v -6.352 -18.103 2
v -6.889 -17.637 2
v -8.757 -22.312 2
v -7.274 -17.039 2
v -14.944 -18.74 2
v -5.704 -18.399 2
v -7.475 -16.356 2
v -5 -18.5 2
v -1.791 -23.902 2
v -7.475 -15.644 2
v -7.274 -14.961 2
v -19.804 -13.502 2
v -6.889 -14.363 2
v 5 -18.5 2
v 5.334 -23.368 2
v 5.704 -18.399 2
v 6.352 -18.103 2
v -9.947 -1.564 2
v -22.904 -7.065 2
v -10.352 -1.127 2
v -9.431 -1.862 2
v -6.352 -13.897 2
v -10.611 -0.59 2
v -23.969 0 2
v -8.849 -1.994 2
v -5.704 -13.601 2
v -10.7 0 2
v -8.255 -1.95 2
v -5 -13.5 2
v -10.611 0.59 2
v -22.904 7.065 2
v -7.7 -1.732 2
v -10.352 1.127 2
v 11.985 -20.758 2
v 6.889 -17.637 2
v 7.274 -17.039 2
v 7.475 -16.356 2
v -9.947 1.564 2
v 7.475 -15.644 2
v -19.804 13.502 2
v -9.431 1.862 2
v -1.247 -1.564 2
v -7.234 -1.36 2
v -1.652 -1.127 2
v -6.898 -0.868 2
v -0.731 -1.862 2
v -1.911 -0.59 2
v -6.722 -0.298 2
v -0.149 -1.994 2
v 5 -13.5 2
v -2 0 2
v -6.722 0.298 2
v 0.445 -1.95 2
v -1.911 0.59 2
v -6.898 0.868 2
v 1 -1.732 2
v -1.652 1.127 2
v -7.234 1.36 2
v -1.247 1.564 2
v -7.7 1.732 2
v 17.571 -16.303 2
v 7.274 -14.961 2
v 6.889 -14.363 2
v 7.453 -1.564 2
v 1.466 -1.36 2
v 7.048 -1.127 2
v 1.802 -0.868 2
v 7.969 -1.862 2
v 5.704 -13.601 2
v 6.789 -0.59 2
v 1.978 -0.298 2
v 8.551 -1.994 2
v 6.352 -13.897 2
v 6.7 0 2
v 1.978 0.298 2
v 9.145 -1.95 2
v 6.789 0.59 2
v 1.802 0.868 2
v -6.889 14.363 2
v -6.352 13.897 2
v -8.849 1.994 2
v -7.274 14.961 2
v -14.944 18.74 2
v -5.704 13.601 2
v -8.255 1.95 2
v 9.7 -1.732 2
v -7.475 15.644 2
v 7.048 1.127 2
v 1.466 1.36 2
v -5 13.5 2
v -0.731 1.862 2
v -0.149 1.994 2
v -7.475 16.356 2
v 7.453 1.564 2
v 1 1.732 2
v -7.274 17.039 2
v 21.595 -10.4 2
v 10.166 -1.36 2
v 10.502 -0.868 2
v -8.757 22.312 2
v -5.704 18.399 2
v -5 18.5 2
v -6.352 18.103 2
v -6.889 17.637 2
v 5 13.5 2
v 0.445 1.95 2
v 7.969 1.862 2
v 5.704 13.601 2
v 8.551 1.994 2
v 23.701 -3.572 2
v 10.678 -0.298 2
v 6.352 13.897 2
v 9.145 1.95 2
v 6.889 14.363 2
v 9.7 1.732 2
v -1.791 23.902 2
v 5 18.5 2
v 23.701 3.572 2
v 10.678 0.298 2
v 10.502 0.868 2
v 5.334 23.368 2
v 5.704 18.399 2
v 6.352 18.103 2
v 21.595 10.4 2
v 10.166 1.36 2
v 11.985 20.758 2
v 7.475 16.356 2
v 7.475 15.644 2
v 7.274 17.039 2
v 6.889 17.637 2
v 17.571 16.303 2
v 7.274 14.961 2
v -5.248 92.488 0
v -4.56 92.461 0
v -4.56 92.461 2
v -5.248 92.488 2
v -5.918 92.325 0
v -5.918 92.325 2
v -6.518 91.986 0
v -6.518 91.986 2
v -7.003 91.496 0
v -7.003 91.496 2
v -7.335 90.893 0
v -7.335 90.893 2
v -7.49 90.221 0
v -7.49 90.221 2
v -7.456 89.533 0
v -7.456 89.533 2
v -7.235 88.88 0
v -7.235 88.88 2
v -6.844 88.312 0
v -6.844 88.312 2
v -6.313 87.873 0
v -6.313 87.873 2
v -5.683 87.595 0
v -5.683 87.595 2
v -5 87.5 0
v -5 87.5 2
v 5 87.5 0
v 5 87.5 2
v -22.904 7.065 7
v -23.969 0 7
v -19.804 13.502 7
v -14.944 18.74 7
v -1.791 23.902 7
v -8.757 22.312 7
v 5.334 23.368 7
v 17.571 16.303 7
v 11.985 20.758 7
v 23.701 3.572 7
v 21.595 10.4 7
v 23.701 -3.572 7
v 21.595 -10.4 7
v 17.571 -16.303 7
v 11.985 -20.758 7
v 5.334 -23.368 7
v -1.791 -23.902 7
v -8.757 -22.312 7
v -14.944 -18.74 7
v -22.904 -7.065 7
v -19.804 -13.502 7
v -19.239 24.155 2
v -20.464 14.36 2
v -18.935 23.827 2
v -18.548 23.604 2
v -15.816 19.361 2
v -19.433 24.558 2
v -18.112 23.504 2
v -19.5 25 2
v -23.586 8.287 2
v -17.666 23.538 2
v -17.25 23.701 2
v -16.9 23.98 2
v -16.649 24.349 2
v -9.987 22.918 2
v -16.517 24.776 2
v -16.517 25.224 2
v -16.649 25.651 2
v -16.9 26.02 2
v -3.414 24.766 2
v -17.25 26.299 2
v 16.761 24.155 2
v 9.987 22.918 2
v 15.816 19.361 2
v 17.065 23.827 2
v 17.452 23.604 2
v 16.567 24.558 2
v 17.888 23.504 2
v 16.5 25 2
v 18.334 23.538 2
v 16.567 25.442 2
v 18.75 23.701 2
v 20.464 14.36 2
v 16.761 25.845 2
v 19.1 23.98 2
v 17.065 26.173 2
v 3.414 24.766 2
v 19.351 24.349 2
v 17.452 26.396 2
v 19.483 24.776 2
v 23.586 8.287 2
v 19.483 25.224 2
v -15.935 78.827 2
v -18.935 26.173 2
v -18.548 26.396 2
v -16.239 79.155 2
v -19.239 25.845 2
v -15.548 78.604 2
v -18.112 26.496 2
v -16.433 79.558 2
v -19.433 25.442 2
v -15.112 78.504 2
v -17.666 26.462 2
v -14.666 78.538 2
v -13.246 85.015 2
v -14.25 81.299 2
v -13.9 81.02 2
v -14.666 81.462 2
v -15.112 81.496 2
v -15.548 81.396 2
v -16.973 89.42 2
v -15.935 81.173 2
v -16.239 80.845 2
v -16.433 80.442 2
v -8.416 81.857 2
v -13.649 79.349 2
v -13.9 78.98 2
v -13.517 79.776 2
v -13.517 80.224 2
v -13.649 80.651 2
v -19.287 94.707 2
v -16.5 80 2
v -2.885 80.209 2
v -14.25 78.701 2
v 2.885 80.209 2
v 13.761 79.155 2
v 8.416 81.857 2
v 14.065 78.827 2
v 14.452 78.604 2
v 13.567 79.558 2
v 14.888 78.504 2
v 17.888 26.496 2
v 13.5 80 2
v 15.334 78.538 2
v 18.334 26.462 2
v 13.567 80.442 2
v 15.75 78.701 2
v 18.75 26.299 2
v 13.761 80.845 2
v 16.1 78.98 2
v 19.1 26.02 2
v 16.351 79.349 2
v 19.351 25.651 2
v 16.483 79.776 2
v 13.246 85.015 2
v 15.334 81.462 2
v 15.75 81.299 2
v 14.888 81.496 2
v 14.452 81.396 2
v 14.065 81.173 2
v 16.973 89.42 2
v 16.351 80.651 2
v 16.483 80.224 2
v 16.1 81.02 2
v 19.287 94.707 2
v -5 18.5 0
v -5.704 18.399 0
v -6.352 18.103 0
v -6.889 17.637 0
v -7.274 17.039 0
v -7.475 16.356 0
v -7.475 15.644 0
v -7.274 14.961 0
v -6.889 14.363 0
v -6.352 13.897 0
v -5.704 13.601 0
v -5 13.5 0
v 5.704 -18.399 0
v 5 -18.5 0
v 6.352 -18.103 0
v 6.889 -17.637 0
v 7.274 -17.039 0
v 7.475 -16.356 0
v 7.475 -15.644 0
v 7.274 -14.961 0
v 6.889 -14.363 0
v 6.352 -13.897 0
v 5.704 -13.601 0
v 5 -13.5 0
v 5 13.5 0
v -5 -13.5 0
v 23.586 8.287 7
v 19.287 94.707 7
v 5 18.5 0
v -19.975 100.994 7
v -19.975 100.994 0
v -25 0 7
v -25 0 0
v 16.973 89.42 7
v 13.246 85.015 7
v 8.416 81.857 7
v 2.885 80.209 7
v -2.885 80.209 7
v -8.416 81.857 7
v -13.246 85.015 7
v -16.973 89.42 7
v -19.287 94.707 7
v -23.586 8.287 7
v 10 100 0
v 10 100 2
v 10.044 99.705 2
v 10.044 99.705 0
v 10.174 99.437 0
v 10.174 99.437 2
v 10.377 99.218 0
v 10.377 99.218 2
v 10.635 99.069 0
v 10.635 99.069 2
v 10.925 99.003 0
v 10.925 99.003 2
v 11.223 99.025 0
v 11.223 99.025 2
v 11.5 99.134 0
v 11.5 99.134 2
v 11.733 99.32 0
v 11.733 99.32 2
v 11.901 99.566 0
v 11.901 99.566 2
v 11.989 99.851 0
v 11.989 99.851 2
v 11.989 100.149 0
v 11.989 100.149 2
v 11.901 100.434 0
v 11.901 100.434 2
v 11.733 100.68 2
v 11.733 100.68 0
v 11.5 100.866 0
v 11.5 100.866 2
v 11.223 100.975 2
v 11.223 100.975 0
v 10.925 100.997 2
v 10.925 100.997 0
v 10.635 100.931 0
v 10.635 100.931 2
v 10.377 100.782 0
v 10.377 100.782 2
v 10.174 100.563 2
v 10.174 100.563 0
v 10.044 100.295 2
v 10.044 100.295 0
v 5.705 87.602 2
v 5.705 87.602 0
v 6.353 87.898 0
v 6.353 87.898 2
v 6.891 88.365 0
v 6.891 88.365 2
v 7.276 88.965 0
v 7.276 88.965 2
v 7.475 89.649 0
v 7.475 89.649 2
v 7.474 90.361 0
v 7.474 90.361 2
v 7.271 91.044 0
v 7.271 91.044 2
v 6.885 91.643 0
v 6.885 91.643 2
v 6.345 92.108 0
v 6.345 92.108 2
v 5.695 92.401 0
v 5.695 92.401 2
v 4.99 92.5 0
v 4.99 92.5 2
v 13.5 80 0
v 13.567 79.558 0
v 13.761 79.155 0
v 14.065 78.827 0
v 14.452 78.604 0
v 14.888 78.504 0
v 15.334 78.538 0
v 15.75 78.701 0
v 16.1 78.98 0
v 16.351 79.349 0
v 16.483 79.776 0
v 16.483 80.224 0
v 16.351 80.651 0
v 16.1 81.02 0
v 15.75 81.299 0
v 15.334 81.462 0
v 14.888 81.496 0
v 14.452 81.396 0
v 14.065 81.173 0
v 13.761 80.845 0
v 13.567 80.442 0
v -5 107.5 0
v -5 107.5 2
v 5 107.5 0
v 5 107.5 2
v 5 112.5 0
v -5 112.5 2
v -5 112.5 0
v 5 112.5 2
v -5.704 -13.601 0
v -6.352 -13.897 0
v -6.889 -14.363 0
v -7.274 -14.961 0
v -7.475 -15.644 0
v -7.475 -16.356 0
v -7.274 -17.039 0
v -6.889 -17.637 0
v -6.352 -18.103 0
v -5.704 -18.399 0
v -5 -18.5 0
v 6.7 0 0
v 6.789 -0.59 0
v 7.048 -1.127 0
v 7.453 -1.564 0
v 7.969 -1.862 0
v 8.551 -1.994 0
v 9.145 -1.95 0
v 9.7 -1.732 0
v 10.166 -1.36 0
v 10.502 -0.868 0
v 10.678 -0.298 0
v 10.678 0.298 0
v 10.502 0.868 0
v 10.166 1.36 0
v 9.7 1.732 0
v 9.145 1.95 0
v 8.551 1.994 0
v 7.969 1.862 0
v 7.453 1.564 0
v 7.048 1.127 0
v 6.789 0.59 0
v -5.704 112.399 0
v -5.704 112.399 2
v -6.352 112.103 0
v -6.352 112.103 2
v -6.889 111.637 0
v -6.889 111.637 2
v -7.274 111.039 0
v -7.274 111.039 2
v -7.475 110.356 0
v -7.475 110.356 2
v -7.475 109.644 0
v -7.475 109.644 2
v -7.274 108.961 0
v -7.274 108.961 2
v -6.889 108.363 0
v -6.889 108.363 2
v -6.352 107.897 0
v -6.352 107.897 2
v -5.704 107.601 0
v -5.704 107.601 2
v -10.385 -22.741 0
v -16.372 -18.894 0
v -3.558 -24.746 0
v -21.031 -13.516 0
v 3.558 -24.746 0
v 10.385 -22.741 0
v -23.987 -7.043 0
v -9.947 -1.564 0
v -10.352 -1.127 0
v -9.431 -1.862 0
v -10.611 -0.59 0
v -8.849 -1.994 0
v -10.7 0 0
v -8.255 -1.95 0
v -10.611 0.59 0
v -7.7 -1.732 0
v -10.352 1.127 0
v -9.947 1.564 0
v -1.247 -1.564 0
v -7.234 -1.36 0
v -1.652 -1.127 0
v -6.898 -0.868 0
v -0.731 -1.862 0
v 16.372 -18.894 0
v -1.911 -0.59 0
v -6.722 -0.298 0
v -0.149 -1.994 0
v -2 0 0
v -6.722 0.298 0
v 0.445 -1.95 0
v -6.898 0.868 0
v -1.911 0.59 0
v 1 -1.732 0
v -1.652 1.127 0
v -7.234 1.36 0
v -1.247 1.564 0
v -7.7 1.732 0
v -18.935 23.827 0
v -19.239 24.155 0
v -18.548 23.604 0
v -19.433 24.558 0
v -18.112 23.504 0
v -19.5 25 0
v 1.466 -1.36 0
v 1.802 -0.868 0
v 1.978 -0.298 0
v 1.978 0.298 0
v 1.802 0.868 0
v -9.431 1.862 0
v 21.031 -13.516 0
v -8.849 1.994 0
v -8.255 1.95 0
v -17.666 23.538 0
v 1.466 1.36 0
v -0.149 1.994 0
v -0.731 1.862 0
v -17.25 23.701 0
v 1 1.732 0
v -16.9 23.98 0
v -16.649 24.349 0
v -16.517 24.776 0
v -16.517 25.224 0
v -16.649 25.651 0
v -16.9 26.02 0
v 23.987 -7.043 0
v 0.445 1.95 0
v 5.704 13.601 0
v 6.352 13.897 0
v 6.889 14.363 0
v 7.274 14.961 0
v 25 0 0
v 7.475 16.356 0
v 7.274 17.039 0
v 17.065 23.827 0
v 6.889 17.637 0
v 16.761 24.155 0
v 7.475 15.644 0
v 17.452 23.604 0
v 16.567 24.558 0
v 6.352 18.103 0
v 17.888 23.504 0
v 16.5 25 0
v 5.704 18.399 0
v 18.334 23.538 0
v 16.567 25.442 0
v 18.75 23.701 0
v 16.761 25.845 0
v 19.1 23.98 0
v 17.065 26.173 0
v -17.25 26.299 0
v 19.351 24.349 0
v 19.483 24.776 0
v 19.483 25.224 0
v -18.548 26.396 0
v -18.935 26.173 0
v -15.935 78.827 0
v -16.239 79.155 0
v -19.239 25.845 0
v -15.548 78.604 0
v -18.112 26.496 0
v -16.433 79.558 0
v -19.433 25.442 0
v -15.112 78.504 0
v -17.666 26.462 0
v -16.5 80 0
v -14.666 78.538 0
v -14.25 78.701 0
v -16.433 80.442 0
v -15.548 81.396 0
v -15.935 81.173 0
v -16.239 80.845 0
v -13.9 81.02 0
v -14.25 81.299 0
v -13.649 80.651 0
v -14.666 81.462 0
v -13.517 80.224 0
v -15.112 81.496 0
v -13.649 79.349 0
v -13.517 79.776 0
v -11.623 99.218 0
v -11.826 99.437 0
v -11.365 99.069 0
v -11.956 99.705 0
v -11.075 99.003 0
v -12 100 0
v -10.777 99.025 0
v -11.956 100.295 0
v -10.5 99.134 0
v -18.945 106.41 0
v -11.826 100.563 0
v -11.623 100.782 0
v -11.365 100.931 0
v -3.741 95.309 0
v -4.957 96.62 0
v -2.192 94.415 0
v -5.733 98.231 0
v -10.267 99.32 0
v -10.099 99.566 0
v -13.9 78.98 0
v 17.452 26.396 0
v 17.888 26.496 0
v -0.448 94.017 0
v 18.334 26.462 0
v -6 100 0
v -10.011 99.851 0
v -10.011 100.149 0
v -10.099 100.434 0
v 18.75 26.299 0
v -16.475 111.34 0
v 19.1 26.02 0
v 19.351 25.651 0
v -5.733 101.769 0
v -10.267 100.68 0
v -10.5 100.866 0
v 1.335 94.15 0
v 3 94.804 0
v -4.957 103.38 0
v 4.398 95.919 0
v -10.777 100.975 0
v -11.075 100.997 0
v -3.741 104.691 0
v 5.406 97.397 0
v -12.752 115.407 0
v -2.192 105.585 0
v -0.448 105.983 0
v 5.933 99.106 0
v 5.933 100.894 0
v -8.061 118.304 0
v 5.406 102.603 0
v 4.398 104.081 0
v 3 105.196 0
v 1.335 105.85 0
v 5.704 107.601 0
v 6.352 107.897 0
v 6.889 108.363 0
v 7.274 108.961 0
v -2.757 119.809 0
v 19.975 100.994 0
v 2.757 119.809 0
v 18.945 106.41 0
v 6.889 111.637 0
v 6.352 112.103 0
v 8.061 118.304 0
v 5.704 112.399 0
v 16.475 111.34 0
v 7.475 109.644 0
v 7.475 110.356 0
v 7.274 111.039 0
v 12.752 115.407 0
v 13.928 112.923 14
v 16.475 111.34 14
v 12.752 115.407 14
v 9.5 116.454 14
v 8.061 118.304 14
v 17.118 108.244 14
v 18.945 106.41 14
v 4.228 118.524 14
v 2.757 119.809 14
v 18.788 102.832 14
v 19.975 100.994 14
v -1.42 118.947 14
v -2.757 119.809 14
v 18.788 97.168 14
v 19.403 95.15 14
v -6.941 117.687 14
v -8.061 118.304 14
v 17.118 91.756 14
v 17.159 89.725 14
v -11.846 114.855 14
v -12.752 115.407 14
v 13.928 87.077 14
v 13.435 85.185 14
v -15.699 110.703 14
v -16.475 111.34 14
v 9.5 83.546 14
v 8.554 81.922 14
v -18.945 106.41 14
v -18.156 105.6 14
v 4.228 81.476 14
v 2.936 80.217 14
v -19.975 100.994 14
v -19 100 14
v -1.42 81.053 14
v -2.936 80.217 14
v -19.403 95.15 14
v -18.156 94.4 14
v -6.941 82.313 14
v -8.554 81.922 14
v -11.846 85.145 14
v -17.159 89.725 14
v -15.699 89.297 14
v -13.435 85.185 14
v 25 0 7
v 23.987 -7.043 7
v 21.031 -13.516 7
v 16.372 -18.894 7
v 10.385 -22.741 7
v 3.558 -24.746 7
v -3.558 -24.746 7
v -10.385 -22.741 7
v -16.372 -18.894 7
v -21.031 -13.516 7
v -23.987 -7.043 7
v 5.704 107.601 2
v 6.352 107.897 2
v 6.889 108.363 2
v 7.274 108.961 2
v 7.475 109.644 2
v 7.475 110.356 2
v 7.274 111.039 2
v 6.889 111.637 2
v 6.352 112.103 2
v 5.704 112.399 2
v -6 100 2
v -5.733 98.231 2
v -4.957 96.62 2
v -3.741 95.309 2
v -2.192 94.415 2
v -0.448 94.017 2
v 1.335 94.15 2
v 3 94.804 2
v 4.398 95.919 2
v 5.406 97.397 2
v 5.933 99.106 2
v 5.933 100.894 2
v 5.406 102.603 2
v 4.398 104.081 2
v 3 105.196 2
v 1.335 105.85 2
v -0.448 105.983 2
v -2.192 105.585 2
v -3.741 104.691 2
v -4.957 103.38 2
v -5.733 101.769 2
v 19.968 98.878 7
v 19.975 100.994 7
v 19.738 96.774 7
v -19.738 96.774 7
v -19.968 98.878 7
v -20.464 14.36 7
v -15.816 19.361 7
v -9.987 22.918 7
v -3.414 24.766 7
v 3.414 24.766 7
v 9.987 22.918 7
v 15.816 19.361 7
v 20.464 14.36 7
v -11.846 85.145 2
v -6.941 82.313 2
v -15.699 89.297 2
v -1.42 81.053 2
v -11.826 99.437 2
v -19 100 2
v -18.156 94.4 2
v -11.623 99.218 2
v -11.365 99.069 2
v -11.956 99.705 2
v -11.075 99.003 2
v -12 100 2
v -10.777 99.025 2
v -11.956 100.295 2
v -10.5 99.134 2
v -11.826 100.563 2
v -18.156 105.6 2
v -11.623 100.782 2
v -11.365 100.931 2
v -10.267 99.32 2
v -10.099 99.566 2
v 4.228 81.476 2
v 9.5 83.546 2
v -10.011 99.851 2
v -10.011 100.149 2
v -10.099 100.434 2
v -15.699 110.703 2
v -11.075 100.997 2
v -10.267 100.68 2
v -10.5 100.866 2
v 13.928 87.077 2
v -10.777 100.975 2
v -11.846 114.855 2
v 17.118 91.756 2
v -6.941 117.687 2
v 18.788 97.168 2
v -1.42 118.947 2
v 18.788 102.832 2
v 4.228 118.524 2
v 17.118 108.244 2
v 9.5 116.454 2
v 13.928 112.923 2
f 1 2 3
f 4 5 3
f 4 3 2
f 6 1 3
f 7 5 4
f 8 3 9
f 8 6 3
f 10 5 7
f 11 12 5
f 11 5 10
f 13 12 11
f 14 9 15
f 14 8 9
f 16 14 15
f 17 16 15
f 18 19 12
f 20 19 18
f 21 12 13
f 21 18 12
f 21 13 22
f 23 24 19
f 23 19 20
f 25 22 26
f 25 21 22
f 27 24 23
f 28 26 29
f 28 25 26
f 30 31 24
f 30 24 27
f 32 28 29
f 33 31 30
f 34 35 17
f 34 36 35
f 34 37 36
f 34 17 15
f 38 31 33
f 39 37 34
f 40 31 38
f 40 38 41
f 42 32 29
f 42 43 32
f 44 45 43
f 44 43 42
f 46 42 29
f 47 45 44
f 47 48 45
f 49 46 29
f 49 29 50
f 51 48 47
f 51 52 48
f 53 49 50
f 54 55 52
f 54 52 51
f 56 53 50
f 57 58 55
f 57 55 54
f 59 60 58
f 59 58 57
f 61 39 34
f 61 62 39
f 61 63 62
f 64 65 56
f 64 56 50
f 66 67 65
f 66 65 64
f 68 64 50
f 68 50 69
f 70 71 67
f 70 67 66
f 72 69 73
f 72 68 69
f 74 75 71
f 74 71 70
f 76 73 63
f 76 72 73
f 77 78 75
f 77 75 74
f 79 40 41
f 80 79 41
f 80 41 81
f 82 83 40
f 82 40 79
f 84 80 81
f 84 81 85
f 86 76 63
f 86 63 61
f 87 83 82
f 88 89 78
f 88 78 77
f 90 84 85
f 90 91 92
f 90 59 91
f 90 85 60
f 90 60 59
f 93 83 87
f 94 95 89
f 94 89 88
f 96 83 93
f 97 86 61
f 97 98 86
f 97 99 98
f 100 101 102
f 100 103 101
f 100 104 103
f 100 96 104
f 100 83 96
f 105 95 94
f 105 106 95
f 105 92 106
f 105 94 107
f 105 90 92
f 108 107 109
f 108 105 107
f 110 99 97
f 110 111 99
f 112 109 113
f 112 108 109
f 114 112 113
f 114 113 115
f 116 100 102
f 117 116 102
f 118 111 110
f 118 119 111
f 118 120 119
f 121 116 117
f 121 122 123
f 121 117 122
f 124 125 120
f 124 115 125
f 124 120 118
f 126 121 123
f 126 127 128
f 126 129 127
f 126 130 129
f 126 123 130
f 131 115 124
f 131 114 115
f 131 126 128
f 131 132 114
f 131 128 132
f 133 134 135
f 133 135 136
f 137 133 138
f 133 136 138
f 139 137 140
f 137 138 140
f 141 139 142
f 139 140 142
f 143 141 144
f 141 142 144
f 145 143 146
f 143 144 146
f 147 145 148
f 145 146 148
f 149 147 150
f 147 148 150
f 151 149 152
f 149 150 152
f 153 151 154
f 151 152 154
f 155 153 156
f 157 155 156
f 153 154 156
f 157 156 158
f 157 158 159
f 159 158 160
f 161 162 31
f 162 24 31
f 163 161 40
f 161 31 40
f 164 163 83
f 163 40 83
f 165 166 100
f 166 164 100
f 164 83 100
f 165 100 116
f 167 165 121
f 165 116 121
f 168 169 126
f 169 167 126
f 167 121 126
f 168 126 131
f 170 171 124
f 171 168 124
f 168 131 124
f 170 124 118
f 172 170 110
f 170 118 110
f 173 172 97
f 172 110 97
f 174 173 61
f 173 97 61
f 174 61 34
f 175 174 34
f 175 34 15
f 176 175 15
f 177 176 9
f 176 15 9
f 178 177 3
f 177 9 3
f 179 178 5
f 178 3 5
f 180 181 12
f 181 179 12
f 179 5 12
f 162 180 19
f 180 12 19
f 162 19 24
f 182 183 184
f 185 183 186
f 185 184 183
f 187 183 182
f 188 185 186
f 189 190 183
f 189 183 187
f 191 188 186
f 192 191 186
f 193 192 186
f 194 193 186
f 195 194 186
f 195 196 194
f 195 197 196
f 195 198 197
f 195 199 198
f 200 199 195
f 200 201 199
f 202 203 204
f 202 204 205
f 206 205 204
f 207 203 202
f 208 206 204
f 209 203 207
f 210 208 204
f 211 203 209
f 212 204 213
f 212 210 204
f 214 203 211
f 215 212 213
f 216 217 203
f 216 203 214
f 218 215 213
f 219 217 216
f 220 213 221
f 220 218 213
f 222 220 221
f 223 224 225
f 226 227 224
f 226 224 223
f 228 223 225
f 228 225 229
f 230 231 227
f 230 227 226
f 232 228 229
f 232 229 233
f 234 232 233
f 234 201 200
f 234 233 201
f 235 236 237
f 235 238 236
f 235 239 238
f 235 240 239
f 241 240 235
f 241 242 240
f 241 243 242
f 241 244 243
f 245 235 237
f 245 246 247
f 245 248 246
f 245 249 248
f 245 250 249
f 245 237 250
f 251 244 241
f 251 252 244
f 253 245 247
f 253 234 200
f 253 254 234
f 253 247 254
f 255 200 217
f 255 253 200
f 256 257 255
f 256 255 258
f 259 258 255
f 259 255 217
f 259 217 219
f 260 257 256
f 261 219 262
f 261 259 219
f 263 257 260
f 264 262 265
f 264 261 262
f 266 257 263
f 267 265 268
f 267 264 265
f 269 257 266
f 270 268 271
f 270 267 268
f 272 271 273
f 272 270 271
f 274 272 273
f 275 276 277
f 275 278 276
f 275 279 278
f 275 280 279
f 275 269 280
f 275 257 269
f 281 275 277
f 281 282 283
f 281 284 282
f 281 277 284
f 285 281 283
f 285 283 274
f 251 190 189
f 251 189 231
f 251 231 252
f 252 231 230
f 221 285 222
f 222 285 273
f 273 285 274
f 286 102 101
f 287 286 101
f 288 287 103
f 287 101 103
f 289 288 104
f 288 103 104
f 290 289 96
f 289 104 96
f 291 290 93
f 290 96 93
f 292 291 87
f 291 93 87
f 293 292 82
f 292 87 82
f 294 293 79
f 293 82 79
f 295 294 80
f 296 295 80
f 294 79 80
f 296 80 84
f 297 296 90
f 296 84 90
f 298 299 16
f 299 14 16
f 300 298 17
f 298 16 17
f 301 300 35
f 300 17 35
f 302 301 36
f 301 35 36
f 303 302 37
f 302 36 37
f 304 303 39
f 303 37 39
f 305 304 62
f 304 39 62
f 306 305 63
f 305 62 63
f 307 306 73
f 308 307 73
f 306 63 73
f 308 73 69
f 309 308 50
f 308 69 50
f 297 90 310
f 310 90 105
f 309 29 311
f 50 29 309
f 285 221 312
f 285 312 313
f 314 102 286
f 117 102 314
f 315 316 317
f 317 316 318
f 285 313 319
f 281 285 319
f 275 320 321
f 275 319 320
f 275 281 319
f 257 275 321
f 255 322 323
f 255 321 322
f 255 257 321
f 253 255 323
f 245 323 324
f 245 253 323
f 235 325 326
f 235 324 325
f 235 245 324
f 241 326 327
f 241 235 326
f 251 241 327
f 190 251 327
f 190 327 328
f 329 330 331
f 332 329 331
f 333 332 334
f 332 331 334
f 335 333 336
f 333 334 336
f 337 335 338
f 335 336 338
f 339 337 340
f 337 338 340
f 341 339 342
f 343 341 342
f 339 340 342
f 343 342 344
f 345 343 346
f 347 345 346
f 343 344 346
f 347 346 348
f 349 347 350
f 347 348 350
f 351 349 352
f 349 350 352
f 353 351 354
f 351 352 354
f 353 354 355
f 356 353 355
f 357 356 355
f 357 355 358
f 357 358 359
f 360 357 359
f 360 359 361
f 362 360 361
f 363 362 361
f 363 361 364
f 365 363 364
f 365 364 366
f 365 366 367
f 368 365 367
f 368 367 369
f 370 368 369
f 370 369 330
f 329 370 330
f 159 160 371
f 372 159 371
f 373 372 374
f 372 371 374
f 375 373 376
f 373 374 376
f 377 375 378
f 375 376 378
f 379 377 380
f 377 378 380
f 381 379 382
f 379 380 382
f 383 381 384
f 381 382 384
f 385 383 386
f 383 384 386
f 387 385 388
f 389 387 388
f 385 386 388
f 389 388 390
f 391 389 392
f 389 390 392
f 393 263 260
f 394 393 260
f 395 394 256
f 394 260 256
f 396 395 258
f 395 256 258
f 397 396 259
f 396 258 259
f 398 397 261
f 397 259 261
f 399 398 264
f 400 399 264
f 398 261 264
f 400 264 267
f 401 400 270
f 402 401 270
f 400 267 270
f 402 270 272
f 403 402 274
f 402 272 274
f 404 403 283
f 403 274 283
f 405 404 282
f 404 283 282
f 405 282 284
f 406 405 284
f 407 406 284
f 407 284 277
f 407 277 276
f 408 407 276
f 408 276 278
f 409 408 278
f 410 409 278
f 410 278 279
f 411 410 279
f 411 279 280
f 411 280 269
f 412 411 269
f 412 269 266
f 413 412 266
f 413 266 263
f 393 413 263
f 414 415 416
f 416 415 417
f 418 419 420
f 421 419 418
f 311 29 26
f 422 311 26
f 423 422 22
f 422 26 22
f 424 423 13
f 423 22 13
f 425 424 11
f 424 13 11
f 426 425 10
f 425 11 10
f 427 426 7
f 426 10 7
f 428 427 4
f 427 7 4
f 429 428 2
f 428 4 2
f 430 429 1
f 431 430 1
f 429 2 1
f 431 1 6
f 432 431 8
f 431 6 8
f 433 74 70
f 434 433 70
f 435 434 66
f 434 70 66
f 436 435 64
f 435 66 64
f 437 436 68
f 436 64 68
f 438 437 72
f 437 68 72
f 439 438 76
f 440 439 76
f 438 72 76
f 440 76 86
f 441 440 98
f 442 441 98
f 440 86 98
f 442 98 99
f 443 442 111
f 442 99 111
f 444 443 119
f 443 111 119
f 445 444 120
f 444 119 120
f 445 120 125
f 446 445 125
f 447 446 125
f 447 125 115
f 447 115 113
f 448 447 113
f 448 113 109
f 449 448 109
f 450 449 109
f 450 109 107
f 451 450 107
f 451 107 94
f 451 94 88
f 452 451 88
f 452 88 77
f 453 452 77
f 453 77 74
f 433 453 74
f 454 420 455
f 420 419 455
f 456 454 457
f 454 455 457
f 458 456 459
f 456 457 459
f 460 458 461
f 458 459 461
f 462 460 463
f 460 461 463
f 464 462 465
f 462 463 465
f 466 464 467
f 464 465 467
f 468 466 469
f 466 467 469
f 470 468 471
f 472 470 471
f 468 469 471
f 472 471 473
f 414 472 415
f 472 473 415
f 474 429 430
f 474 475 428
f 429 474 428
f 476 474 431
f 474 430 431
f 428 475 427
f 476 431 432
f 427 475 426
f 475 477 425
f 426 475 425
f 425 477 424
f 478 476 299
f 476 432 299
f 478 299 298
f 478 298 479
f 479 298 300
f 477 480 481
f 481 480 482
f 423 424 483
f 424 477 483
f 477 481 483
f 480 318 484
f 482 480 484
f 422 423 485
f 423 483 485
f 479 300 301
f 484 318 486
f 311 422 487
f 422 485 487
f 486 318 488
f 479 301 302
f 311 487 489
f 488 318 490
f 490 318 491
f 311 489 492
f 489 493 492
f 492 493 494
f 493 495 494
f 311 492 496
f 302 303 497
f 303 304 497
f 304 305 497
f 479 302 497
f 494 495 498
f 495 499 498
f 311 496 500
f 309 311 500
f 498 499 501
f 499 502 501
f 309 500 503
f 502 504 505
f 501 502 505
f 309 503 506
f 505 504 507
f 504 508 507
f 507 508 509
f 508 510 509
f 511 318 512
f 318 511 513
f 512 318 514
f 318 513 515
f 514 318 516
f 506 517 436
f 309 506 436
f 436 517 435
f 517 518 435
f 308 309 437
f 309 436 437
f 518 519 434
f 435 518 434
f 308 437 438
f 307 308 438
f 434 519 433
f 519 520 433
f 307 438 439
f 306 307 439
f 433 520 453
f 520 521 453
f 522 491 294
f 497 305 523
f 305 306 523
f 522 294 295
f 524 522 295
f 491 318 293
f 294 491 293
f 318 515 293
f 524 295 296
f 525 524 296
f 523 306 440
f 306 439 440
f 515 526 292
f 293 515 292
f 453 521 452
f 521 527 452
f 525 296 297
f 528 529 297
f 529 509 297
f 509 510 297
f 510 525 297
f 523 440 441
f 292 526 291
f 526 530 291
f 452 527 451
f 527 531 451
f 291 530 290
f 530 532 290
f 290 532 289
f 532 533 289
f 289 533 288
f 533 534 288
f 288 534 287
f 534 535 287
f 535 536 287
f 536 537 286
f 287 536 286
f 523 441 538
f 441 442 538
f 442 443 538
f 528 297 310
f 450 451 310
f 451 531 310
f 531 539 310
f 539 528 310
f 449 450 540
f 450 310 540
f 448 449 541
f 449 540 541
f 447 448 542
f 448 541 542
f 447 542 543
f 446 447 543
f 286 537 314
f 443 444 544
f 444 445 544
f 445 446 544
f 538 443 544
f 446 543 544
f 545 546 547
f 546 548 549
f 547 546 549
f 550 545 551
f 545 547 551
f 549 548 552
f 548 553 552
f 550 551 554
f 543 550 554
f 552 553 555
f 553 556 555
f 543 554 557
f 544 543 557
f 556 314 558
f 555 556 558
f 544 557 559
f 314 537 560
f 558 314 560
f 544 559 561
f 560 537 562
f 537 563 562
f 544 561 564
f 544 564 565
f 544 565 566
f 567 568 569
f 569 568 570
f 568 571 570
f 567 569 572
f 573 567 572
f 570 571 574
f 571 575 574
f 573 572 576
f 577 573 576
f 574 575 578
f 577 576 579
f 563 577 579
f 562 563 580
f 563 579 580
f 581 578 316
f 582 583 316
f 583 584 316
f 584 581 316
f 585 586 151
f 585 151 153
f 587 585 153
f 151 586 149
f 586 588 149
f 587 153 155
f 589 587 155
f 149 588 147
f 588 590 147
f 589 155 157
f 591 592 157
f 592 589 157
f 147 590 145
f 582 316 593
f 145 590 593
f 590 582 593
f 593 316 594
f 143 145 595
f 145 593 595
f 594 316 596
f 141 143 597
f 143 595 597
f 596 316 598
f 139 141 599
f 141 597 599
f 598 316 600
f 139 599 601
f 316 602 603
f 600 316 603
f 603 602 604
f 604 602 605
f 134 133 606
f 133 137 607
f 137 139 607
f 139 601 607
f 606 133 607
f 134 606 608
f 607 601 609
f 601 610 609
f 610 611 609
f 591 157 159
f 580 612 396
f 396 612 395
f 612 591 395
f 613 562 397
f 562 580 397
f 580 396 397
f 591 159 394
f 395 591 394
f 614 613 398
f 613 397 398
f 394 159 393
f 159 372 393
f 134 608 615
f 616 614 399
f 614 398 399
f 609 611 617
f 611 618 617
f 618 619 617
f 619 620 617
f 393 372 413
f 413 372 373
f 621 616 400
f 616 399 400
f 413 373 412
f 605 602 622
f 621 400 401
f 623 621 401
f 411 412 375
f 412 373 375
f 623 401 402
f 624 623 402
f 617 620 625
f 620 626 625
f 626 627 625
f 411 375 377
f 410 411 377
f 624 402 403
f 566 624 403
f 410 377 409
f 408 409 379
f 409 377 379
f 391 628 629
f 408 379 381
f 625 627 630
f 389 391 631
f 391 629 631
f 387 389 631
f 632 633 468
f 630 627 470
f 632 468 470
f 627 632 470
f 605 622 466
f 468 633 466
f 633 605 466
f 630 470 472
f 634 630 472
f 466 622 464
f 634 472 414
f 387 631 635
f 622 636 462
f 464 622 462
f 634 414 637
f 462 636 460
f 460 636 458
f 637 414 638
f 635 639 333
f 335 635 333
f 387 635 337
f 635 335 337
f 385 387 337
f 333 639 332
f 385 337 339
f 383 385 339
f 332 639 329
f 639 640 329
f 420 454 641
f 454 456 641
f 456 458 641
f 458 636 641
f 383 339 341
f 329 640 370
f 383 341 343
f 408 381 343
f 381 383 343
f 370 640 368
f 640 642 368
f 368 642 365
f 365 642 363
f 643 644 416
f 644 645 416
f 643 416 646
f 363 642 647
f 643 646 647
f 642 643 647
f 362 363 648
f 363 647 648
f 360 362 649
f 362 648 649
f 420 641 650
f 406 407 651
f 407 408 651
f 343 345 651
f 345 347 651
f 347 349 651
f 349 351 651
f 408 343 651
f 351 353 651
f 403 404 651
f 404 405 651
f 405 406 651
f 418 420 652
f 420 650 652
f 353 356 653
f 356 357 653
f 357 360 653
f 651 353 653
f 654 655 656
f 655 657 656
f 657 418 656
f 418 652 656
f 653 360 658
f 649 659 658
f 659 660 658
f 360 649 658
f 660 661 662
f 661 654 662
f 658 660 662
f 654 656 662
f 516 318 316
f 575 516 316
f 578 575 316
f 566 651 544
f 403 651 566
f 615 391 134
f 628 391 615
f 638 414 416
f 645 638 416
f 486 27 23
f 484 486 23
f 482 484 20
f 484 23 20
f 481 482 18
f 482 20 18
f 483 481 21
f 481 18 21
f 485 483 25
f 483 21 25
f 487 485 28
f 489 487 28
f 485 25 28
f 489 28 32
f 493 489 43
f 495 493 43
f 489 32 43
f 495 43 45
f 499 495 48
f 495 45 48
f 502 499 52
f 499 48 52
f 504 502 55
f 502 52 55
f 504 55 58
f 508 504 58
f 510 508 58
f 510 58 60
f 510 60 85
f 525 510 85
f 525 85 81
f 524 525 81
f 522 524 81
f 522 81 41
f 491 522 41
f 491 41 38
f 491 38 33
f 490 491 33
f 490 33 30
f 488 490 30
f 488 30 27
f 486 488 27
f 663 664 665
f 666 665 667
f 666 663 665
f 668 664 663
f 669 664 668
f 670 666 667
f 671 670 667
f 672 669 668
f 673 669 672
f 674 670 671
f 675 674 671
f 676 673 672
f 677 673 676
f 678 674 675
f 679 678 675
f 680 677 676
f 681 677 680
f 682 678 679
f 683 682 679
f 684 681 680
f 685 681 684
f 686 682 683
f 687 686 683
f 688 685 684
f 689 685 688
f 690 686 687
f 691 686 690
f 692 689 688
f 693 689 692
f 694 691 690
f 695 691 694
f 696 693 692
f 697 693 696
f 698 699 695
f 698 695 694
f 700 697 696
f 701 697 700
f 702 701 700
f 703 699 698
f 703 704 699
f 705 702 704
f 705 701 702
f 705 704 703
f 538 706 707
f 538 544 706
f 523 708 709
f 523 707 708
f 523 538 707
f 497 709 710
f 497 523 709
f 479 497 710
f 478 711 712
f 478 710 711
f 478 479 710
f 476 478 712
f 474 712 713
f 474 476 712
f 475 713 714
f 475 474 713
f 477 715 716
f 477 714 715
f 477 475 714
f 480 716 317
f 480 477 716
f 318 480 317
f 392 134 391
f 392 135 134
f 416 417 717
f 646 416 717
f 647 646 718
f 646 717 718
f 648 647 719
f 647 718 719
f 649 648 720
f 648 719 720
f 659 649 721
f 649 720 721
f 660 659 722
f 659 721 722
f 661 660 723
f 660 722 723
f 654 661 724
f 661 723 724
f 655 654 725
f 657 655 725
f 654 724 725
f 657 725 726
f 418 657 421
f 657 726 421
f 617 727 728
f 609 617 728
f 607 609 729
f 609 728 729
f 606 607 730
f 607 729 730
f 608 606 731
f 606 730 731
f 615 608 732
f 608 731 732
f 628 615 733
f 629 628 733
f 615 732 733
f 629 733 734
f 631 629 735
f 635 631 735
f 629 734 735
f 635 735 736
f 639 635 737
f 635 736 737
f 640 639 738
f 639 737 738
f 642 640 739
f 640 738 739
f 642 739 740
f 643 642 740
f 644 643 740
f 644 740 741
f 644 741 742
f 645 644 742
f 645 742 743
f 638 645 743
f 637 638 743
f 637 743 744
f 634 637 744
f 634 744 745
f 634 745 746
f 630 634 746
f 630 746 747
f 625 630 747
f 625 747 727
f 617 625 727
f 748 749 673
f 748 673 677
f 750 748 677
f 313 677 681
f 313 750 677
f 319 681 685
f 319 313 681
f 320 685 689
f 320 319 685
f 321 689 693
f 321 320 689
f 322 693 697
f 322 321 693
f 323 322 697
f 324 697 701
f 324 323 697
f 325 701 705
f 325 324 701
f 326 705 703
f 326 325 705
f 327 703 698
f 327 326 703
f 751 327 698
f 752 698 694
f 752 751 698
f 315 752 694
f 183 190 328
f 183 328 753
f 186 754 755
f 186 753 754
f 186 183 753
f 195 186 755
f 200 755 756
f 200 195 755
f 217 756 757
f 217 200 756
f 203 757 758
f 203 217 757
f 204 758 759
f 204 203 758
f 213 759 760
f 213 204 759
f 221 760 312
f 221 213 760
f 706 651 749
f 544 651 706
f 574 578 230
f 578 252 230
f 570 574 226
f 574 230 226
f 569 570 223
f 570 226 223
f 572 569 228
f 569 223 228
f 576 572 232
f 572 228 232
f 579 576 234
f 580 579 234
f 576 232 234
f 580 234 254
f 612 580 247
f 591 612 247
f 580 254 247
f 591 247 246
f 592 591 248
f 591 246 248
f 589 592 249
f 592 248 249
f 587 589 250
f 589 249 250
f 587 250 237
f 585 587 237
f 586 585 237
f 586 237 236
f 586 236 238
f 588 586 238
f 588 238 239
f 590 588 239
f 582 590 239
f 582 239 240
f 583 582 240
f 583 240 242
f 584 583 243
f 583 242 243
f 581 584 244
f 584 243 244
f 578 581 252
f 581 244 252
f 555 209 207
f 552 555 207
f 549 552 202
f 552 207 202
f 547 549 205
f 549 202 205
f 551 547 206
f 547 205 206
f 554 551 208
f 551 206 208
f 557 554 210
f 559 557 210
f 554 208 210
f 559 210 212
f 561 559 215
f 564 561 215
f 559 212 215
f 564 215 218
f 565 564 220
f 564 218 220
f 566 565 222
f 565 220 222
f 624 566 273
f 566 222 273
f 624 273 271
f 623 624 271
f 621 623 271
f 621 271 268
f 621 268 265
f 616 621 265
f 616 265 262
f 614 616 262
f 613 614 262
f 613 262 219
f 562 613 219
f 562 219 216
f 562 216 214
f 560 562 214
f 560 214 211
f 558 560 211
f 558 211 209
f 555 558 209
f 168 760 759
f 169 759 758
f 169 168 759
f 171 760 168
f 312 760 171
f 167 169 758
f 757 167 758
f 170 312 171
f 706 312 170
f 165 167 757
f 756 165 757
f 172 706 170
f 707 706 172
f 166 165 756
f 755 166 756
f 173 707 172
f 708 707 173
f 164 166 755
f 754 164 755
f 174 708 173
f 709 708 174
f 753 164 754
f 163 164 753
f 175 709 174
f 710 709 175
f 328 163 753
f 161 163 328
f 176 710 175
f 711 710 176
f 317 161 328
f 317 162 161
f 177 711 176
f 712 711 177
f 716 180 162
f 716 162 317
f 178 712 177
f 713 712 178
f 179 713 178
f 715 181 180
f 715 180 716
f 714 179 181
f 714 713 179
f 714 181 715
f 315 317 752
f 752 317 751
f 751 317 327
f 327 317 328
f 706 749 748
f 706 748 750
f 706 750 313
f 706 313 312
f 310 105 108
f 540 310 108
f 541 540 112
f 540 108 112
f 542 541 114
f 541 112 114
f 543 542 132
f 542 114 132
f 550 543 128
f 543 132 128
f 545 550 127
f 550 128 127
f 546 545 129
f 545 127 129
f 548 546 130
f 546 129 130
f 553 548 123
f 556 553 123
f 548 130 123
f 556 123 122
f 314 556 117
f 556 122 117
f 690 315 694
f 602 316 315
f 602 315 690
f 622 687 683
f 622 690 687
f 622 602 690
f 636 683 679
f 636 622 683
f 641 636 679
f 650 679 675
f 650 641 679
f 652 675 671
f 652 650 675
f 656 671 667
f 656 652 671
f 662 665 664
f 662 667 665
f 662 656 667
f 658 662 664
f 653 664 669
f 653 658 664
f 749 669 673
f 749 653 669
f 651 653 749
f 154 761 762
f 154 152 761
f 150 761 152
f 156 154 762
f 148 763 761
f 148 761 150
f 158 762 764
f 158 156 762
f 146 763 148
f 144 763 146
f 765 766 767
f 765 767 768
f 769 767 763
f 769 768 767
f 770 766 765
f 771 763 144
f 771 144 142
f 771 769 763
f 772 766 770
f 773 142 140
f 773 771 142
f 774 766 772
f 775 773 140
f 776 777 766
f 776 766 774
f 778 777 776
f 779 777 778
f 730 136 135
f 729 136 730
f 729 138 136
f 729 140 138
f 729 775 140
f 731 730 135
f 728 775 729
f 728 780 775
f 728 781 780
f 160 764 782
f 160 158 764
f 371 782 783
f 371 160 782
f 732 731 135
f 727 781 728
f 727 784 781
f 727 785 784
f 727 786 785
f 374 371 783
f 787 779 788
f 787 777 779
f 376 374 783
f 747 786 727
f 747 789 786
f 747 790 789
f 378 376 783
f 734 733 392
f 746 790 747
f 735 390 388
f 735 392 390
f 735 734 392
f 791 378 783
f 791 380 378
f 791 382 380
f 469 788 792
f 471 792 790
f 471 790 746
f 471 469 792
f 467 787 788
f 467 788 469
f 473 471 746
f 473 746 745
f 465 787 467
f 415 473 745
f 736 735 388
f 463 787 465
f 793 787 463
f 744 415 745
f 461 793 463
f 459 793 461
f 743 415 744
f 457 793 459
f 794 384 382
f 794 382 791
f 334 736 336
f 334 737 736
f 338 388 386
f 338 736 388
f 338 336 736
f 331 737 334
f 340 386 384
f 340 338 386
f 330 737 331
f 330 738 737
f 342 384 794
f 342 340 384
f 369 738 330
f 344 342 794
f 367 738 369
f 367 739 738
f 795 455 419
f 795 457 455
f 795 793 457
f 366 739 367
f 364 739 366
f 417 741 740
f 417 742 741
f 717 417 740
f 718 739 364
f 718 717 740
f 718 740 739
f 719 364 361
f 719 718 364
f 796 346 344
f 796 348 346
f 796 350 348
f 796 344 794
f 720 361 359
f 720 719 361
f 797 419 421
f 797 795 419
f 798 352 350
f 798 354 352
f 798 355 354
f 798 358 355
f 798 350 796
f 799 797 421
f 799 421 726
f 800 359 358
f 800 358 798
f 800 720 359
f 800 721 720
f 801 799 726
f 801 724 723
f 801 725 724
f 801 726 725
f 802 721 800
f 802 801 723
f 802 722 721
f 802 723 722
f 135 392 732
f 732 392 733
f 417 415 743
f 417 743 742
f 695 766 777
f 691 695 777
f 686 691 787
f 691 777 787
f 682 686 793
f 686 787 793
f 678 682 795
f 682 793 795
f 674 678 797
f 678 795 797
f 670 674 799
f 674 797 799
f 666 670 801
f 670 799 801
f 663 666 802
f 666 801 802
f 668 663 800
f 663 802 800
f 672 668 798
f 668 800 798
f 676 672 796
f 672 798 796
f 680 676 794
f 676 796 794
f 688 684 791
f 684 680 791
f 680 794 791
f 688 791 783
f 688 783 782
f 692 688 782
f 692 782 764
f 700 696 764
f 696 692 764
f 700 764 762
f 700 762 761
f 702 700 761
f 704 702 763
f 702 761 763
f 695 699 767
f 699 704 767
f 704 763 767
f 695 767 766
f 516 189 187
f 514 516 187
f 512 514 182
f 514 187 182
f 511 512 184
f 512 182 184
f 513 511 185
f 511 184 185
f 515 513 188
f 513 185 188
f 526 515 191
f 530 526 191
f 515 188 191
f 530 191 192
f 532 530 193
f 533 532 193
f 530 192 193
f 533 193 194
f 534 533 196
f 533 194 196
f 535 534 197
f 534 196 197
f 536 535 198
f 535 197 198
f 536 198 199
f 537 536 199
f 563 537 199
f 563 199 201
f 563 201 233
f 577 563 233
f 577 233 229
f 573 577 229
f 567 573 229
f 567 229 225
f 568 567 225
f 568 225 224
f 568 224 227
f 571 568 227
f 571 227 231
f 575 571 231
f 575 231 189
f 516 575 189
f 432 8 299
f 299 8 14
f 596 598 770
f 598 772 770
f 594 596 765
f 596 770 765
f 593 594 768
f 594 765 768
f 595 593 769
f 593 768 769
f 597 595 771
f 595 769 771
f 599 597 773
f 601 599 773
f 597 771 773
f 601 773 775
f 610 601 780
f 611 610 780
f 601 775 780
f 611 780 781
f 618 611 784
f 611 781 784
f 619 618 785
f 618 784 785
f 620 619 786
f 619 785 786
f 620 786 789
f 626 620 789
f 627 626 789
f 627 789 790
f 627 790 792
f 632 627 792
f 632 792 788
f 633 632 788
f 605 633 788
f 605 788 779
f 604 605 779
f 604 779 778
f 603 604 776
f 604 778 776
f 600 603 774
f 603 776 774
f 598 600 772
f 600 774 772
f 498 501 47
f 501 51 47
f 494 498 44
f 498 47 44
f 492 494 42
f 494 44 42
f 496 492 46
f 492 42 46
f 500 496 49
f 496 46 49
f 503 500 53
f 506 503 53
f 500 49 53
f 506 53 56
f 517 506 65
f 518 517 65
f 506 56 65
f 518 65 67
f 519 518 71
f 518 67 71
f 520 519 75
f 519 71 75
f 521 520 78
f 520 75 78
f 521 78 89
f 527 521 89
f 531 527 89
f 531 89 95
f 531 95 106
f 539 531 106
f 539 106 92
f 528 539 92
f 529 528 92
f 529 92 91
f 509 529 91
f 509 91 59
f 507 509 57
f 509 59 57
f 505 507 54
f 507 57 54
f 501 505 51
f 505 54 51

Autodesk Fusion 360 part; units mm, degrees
sketch "스케치1" plane through (0, 0, 0) normal (0, 0, 1) x (1, 0, 0)
  line L0 (19.9753, 100.9938) -> (25, 0)
  line L1 (-19.9753, 100.9938) -> (-25, 0)
  arc A0 (19.9753, 100.9938) -> (-19.9753, 100.9938) centre (0, 100) ccw
  arc A1 (-25, 0) -> (25, 0) centre (0, 0) ccw
  dimension "d1" = 50
  dimension "d222" = 20
  dimension "d223" = 100
extrude "돌출1" add sketch "스케치1" along normal blind 2
sketch "스케치2" plane through (0, 0, 2) normal (0, 0, 1) x (-1, 0, 0)
  arc A0 (-19.9753, -100.9938) -> (19.9753, -100.9938) centre (0, -100) ccw
  line L0 (19.9753, -100.9938) -> (25, 0)
  line L1 (-25, 0) -> (-19.9753, -100.9938)
  line L2 (19.9753, -100.9938) -> (25, 0)
  arc A1 (-19.9753, -100.9938) -> (19.9753, -100.9938) centre (0, -100) ccw
  line L3 (-25, 0) -> (-19.9753, -100.9938)
  arc A2 (25, 0) -> (-25, 0) centre (0, 0) ccw
  line L4 (-23.5864, -8.2873) -> (-19.2868, -94.7068)
  line L5 (19.2868, -94.7068) -> (23.5864, -8.2873)
  circle A3 centre (0, -100) radius 19
  circle A4 centre (0, 0) radius 23.9691
  arc A5 (-23.5864, -8.2873) -> (23.5864, -8.2873) centre (0, 0) ccw
  arc A6 (25, 0) -> (-25, 0) centre (0, 0) ccw
  arc A7 (-19.9753, -100.9938) -> (19.9753, -100.9938) centre (0, -100) ccw
  arc A8 (19.2868, -94.7068) -> (-19.2868, -94.7068) centre (0, -100) ccw
extrude "돌출25" add sketch "스케치2" along normal blind 5
sketch "스케치22" plane through (0, 0, 2) normal (0, 0, 1) x (-1, 0, 0)
  circle A0 centre (0, 0) radius 2
  circle A1 centre (-8.7, 0) radius 2
  circle A2 centre (8.7, 0) radius 2
  circle A3 centre (0, -100) radius 6
  circle A4 centre (-11, -100) radius 1
  circle A5 centre (11, -100) radius 1
  dimension "d208" = 4
  dimension "d209" = 8.7
  dimension "d210" = 8.7
  dimension "d226" = 12
  dimension "d227" = 2
  dimension "d228" = 11
  dimension "d229" = 11
  dimension "d230" = 100
extrude "돌출26" cut sketch "스케치22" against normal blind 2
sketch "스케치24" plane through (0, 0, 7) normal (0, 0, 1) x (-1, 0, 0)
  circle A0 centre (0, -100) radius 20
  circle A1 centre (0, -100) radius 6
  arc A2 (-19.9753, -100.9938) -> (19.9753, -100.9938) centre (0, -100) ccw
  circle A3 centre (0, -100) radius 19
  circle A4 centre (0, -100) radius 19
extrude "돌출28" add sketch "스케치24" along normal blind 7 contours A0 A2
sketch "스케치23" plane through (0, 0, 2) normal (0, 0, 1) x (-1, 0, 0)
  circle A0 centre (-18, -25) radius 1.5
  circle A1 centre (-15, -80) radius 1.5
  circle A2 centre (15, -80) radius 1.5
  circle A3 centre (18, -25) radius 1.5
  circle A4 centre (0, -100) radius 6
  dimension "d214" = 3
  dimension "d215" = 18
  dimension "d216" = 18
  dimension "d217" = 25
  dimension "d225" = 20
  dimension "d233" = 15
  dimension "d234" = 15
extrude "돌출27" cut sketch "스케치23" against normal blind 2 contours A0 | A1 | A2 | A3
sketch "스케치26" plane through (0, 0, 2) normal (0, 0, 1) x (-1, 0, 0)
  line L0 (5, -13.5) -> (-5, -13.5)
  line L1 (5, -18.5) -> (-5, -18.5)
  arc A0 (-5, -13.5) -> (-5, -18.5) centre (-5, -16) ccw
  arc A1 (5, -18.5) -> (5, -13.5) centre (5, -16) ccw
  line L2 (5, 13.5) -> (-5, 13.5)
  line L3 (5, 18.5) -> (-5, 18.5)
  arc A2 (5, 13.5) -> (5, 18.5) centre (5, 16) ccw
  arc A3 (-5, 18.5) -> (-5, 13.5) centre (-5, 16) ccw
  line L4 (5, -112.5) -> (-5, -112.5)
  line L5 (5, -107.5) -> (-5, -107.5)
  arc A4 (5, -112.5) -> (5, -107.5) centre (5, -110) ccw
  arc A5 (-5, -107.5) -> (-5, -112.5) centre (-5, -110) ccw
  line L6 (4.5597, -92.4609) -> (-4.9898, -92.5)
  line L7 (5, -87.5) -> (-5, -87.5)
  arc A6 (4.5597, -92.4609) -> (5, -87.5) centre (5, -90) ccw
  arc A7 (-5, -87.5) -> (-4.9898, -92.5) centre (-5, -90) ccw
  circle A8 centre (0, -100) radius 6
  dimension "d235" = 5
  dimension "d236" = 10
  dimension "d239" = 16
  dimension "d241" = 5
  dimension "d242" = 5
  dimension "d243" = 10
  dimension "d244" = 16
  dimension "d245" = 5
  dimension "d248" = 5
  dimension "d249" = 10
  dimension "d250" = 10
  dimension "d251" = 10
  dimension "d252" = 5
extrude "돌출29" cut sketch "스케치26" against normal blind 2 contours L0 L1 A0 A1 | L2 L3 A2 A3 | L4 L5 A4 A5 | L6 L7 A6 A7
